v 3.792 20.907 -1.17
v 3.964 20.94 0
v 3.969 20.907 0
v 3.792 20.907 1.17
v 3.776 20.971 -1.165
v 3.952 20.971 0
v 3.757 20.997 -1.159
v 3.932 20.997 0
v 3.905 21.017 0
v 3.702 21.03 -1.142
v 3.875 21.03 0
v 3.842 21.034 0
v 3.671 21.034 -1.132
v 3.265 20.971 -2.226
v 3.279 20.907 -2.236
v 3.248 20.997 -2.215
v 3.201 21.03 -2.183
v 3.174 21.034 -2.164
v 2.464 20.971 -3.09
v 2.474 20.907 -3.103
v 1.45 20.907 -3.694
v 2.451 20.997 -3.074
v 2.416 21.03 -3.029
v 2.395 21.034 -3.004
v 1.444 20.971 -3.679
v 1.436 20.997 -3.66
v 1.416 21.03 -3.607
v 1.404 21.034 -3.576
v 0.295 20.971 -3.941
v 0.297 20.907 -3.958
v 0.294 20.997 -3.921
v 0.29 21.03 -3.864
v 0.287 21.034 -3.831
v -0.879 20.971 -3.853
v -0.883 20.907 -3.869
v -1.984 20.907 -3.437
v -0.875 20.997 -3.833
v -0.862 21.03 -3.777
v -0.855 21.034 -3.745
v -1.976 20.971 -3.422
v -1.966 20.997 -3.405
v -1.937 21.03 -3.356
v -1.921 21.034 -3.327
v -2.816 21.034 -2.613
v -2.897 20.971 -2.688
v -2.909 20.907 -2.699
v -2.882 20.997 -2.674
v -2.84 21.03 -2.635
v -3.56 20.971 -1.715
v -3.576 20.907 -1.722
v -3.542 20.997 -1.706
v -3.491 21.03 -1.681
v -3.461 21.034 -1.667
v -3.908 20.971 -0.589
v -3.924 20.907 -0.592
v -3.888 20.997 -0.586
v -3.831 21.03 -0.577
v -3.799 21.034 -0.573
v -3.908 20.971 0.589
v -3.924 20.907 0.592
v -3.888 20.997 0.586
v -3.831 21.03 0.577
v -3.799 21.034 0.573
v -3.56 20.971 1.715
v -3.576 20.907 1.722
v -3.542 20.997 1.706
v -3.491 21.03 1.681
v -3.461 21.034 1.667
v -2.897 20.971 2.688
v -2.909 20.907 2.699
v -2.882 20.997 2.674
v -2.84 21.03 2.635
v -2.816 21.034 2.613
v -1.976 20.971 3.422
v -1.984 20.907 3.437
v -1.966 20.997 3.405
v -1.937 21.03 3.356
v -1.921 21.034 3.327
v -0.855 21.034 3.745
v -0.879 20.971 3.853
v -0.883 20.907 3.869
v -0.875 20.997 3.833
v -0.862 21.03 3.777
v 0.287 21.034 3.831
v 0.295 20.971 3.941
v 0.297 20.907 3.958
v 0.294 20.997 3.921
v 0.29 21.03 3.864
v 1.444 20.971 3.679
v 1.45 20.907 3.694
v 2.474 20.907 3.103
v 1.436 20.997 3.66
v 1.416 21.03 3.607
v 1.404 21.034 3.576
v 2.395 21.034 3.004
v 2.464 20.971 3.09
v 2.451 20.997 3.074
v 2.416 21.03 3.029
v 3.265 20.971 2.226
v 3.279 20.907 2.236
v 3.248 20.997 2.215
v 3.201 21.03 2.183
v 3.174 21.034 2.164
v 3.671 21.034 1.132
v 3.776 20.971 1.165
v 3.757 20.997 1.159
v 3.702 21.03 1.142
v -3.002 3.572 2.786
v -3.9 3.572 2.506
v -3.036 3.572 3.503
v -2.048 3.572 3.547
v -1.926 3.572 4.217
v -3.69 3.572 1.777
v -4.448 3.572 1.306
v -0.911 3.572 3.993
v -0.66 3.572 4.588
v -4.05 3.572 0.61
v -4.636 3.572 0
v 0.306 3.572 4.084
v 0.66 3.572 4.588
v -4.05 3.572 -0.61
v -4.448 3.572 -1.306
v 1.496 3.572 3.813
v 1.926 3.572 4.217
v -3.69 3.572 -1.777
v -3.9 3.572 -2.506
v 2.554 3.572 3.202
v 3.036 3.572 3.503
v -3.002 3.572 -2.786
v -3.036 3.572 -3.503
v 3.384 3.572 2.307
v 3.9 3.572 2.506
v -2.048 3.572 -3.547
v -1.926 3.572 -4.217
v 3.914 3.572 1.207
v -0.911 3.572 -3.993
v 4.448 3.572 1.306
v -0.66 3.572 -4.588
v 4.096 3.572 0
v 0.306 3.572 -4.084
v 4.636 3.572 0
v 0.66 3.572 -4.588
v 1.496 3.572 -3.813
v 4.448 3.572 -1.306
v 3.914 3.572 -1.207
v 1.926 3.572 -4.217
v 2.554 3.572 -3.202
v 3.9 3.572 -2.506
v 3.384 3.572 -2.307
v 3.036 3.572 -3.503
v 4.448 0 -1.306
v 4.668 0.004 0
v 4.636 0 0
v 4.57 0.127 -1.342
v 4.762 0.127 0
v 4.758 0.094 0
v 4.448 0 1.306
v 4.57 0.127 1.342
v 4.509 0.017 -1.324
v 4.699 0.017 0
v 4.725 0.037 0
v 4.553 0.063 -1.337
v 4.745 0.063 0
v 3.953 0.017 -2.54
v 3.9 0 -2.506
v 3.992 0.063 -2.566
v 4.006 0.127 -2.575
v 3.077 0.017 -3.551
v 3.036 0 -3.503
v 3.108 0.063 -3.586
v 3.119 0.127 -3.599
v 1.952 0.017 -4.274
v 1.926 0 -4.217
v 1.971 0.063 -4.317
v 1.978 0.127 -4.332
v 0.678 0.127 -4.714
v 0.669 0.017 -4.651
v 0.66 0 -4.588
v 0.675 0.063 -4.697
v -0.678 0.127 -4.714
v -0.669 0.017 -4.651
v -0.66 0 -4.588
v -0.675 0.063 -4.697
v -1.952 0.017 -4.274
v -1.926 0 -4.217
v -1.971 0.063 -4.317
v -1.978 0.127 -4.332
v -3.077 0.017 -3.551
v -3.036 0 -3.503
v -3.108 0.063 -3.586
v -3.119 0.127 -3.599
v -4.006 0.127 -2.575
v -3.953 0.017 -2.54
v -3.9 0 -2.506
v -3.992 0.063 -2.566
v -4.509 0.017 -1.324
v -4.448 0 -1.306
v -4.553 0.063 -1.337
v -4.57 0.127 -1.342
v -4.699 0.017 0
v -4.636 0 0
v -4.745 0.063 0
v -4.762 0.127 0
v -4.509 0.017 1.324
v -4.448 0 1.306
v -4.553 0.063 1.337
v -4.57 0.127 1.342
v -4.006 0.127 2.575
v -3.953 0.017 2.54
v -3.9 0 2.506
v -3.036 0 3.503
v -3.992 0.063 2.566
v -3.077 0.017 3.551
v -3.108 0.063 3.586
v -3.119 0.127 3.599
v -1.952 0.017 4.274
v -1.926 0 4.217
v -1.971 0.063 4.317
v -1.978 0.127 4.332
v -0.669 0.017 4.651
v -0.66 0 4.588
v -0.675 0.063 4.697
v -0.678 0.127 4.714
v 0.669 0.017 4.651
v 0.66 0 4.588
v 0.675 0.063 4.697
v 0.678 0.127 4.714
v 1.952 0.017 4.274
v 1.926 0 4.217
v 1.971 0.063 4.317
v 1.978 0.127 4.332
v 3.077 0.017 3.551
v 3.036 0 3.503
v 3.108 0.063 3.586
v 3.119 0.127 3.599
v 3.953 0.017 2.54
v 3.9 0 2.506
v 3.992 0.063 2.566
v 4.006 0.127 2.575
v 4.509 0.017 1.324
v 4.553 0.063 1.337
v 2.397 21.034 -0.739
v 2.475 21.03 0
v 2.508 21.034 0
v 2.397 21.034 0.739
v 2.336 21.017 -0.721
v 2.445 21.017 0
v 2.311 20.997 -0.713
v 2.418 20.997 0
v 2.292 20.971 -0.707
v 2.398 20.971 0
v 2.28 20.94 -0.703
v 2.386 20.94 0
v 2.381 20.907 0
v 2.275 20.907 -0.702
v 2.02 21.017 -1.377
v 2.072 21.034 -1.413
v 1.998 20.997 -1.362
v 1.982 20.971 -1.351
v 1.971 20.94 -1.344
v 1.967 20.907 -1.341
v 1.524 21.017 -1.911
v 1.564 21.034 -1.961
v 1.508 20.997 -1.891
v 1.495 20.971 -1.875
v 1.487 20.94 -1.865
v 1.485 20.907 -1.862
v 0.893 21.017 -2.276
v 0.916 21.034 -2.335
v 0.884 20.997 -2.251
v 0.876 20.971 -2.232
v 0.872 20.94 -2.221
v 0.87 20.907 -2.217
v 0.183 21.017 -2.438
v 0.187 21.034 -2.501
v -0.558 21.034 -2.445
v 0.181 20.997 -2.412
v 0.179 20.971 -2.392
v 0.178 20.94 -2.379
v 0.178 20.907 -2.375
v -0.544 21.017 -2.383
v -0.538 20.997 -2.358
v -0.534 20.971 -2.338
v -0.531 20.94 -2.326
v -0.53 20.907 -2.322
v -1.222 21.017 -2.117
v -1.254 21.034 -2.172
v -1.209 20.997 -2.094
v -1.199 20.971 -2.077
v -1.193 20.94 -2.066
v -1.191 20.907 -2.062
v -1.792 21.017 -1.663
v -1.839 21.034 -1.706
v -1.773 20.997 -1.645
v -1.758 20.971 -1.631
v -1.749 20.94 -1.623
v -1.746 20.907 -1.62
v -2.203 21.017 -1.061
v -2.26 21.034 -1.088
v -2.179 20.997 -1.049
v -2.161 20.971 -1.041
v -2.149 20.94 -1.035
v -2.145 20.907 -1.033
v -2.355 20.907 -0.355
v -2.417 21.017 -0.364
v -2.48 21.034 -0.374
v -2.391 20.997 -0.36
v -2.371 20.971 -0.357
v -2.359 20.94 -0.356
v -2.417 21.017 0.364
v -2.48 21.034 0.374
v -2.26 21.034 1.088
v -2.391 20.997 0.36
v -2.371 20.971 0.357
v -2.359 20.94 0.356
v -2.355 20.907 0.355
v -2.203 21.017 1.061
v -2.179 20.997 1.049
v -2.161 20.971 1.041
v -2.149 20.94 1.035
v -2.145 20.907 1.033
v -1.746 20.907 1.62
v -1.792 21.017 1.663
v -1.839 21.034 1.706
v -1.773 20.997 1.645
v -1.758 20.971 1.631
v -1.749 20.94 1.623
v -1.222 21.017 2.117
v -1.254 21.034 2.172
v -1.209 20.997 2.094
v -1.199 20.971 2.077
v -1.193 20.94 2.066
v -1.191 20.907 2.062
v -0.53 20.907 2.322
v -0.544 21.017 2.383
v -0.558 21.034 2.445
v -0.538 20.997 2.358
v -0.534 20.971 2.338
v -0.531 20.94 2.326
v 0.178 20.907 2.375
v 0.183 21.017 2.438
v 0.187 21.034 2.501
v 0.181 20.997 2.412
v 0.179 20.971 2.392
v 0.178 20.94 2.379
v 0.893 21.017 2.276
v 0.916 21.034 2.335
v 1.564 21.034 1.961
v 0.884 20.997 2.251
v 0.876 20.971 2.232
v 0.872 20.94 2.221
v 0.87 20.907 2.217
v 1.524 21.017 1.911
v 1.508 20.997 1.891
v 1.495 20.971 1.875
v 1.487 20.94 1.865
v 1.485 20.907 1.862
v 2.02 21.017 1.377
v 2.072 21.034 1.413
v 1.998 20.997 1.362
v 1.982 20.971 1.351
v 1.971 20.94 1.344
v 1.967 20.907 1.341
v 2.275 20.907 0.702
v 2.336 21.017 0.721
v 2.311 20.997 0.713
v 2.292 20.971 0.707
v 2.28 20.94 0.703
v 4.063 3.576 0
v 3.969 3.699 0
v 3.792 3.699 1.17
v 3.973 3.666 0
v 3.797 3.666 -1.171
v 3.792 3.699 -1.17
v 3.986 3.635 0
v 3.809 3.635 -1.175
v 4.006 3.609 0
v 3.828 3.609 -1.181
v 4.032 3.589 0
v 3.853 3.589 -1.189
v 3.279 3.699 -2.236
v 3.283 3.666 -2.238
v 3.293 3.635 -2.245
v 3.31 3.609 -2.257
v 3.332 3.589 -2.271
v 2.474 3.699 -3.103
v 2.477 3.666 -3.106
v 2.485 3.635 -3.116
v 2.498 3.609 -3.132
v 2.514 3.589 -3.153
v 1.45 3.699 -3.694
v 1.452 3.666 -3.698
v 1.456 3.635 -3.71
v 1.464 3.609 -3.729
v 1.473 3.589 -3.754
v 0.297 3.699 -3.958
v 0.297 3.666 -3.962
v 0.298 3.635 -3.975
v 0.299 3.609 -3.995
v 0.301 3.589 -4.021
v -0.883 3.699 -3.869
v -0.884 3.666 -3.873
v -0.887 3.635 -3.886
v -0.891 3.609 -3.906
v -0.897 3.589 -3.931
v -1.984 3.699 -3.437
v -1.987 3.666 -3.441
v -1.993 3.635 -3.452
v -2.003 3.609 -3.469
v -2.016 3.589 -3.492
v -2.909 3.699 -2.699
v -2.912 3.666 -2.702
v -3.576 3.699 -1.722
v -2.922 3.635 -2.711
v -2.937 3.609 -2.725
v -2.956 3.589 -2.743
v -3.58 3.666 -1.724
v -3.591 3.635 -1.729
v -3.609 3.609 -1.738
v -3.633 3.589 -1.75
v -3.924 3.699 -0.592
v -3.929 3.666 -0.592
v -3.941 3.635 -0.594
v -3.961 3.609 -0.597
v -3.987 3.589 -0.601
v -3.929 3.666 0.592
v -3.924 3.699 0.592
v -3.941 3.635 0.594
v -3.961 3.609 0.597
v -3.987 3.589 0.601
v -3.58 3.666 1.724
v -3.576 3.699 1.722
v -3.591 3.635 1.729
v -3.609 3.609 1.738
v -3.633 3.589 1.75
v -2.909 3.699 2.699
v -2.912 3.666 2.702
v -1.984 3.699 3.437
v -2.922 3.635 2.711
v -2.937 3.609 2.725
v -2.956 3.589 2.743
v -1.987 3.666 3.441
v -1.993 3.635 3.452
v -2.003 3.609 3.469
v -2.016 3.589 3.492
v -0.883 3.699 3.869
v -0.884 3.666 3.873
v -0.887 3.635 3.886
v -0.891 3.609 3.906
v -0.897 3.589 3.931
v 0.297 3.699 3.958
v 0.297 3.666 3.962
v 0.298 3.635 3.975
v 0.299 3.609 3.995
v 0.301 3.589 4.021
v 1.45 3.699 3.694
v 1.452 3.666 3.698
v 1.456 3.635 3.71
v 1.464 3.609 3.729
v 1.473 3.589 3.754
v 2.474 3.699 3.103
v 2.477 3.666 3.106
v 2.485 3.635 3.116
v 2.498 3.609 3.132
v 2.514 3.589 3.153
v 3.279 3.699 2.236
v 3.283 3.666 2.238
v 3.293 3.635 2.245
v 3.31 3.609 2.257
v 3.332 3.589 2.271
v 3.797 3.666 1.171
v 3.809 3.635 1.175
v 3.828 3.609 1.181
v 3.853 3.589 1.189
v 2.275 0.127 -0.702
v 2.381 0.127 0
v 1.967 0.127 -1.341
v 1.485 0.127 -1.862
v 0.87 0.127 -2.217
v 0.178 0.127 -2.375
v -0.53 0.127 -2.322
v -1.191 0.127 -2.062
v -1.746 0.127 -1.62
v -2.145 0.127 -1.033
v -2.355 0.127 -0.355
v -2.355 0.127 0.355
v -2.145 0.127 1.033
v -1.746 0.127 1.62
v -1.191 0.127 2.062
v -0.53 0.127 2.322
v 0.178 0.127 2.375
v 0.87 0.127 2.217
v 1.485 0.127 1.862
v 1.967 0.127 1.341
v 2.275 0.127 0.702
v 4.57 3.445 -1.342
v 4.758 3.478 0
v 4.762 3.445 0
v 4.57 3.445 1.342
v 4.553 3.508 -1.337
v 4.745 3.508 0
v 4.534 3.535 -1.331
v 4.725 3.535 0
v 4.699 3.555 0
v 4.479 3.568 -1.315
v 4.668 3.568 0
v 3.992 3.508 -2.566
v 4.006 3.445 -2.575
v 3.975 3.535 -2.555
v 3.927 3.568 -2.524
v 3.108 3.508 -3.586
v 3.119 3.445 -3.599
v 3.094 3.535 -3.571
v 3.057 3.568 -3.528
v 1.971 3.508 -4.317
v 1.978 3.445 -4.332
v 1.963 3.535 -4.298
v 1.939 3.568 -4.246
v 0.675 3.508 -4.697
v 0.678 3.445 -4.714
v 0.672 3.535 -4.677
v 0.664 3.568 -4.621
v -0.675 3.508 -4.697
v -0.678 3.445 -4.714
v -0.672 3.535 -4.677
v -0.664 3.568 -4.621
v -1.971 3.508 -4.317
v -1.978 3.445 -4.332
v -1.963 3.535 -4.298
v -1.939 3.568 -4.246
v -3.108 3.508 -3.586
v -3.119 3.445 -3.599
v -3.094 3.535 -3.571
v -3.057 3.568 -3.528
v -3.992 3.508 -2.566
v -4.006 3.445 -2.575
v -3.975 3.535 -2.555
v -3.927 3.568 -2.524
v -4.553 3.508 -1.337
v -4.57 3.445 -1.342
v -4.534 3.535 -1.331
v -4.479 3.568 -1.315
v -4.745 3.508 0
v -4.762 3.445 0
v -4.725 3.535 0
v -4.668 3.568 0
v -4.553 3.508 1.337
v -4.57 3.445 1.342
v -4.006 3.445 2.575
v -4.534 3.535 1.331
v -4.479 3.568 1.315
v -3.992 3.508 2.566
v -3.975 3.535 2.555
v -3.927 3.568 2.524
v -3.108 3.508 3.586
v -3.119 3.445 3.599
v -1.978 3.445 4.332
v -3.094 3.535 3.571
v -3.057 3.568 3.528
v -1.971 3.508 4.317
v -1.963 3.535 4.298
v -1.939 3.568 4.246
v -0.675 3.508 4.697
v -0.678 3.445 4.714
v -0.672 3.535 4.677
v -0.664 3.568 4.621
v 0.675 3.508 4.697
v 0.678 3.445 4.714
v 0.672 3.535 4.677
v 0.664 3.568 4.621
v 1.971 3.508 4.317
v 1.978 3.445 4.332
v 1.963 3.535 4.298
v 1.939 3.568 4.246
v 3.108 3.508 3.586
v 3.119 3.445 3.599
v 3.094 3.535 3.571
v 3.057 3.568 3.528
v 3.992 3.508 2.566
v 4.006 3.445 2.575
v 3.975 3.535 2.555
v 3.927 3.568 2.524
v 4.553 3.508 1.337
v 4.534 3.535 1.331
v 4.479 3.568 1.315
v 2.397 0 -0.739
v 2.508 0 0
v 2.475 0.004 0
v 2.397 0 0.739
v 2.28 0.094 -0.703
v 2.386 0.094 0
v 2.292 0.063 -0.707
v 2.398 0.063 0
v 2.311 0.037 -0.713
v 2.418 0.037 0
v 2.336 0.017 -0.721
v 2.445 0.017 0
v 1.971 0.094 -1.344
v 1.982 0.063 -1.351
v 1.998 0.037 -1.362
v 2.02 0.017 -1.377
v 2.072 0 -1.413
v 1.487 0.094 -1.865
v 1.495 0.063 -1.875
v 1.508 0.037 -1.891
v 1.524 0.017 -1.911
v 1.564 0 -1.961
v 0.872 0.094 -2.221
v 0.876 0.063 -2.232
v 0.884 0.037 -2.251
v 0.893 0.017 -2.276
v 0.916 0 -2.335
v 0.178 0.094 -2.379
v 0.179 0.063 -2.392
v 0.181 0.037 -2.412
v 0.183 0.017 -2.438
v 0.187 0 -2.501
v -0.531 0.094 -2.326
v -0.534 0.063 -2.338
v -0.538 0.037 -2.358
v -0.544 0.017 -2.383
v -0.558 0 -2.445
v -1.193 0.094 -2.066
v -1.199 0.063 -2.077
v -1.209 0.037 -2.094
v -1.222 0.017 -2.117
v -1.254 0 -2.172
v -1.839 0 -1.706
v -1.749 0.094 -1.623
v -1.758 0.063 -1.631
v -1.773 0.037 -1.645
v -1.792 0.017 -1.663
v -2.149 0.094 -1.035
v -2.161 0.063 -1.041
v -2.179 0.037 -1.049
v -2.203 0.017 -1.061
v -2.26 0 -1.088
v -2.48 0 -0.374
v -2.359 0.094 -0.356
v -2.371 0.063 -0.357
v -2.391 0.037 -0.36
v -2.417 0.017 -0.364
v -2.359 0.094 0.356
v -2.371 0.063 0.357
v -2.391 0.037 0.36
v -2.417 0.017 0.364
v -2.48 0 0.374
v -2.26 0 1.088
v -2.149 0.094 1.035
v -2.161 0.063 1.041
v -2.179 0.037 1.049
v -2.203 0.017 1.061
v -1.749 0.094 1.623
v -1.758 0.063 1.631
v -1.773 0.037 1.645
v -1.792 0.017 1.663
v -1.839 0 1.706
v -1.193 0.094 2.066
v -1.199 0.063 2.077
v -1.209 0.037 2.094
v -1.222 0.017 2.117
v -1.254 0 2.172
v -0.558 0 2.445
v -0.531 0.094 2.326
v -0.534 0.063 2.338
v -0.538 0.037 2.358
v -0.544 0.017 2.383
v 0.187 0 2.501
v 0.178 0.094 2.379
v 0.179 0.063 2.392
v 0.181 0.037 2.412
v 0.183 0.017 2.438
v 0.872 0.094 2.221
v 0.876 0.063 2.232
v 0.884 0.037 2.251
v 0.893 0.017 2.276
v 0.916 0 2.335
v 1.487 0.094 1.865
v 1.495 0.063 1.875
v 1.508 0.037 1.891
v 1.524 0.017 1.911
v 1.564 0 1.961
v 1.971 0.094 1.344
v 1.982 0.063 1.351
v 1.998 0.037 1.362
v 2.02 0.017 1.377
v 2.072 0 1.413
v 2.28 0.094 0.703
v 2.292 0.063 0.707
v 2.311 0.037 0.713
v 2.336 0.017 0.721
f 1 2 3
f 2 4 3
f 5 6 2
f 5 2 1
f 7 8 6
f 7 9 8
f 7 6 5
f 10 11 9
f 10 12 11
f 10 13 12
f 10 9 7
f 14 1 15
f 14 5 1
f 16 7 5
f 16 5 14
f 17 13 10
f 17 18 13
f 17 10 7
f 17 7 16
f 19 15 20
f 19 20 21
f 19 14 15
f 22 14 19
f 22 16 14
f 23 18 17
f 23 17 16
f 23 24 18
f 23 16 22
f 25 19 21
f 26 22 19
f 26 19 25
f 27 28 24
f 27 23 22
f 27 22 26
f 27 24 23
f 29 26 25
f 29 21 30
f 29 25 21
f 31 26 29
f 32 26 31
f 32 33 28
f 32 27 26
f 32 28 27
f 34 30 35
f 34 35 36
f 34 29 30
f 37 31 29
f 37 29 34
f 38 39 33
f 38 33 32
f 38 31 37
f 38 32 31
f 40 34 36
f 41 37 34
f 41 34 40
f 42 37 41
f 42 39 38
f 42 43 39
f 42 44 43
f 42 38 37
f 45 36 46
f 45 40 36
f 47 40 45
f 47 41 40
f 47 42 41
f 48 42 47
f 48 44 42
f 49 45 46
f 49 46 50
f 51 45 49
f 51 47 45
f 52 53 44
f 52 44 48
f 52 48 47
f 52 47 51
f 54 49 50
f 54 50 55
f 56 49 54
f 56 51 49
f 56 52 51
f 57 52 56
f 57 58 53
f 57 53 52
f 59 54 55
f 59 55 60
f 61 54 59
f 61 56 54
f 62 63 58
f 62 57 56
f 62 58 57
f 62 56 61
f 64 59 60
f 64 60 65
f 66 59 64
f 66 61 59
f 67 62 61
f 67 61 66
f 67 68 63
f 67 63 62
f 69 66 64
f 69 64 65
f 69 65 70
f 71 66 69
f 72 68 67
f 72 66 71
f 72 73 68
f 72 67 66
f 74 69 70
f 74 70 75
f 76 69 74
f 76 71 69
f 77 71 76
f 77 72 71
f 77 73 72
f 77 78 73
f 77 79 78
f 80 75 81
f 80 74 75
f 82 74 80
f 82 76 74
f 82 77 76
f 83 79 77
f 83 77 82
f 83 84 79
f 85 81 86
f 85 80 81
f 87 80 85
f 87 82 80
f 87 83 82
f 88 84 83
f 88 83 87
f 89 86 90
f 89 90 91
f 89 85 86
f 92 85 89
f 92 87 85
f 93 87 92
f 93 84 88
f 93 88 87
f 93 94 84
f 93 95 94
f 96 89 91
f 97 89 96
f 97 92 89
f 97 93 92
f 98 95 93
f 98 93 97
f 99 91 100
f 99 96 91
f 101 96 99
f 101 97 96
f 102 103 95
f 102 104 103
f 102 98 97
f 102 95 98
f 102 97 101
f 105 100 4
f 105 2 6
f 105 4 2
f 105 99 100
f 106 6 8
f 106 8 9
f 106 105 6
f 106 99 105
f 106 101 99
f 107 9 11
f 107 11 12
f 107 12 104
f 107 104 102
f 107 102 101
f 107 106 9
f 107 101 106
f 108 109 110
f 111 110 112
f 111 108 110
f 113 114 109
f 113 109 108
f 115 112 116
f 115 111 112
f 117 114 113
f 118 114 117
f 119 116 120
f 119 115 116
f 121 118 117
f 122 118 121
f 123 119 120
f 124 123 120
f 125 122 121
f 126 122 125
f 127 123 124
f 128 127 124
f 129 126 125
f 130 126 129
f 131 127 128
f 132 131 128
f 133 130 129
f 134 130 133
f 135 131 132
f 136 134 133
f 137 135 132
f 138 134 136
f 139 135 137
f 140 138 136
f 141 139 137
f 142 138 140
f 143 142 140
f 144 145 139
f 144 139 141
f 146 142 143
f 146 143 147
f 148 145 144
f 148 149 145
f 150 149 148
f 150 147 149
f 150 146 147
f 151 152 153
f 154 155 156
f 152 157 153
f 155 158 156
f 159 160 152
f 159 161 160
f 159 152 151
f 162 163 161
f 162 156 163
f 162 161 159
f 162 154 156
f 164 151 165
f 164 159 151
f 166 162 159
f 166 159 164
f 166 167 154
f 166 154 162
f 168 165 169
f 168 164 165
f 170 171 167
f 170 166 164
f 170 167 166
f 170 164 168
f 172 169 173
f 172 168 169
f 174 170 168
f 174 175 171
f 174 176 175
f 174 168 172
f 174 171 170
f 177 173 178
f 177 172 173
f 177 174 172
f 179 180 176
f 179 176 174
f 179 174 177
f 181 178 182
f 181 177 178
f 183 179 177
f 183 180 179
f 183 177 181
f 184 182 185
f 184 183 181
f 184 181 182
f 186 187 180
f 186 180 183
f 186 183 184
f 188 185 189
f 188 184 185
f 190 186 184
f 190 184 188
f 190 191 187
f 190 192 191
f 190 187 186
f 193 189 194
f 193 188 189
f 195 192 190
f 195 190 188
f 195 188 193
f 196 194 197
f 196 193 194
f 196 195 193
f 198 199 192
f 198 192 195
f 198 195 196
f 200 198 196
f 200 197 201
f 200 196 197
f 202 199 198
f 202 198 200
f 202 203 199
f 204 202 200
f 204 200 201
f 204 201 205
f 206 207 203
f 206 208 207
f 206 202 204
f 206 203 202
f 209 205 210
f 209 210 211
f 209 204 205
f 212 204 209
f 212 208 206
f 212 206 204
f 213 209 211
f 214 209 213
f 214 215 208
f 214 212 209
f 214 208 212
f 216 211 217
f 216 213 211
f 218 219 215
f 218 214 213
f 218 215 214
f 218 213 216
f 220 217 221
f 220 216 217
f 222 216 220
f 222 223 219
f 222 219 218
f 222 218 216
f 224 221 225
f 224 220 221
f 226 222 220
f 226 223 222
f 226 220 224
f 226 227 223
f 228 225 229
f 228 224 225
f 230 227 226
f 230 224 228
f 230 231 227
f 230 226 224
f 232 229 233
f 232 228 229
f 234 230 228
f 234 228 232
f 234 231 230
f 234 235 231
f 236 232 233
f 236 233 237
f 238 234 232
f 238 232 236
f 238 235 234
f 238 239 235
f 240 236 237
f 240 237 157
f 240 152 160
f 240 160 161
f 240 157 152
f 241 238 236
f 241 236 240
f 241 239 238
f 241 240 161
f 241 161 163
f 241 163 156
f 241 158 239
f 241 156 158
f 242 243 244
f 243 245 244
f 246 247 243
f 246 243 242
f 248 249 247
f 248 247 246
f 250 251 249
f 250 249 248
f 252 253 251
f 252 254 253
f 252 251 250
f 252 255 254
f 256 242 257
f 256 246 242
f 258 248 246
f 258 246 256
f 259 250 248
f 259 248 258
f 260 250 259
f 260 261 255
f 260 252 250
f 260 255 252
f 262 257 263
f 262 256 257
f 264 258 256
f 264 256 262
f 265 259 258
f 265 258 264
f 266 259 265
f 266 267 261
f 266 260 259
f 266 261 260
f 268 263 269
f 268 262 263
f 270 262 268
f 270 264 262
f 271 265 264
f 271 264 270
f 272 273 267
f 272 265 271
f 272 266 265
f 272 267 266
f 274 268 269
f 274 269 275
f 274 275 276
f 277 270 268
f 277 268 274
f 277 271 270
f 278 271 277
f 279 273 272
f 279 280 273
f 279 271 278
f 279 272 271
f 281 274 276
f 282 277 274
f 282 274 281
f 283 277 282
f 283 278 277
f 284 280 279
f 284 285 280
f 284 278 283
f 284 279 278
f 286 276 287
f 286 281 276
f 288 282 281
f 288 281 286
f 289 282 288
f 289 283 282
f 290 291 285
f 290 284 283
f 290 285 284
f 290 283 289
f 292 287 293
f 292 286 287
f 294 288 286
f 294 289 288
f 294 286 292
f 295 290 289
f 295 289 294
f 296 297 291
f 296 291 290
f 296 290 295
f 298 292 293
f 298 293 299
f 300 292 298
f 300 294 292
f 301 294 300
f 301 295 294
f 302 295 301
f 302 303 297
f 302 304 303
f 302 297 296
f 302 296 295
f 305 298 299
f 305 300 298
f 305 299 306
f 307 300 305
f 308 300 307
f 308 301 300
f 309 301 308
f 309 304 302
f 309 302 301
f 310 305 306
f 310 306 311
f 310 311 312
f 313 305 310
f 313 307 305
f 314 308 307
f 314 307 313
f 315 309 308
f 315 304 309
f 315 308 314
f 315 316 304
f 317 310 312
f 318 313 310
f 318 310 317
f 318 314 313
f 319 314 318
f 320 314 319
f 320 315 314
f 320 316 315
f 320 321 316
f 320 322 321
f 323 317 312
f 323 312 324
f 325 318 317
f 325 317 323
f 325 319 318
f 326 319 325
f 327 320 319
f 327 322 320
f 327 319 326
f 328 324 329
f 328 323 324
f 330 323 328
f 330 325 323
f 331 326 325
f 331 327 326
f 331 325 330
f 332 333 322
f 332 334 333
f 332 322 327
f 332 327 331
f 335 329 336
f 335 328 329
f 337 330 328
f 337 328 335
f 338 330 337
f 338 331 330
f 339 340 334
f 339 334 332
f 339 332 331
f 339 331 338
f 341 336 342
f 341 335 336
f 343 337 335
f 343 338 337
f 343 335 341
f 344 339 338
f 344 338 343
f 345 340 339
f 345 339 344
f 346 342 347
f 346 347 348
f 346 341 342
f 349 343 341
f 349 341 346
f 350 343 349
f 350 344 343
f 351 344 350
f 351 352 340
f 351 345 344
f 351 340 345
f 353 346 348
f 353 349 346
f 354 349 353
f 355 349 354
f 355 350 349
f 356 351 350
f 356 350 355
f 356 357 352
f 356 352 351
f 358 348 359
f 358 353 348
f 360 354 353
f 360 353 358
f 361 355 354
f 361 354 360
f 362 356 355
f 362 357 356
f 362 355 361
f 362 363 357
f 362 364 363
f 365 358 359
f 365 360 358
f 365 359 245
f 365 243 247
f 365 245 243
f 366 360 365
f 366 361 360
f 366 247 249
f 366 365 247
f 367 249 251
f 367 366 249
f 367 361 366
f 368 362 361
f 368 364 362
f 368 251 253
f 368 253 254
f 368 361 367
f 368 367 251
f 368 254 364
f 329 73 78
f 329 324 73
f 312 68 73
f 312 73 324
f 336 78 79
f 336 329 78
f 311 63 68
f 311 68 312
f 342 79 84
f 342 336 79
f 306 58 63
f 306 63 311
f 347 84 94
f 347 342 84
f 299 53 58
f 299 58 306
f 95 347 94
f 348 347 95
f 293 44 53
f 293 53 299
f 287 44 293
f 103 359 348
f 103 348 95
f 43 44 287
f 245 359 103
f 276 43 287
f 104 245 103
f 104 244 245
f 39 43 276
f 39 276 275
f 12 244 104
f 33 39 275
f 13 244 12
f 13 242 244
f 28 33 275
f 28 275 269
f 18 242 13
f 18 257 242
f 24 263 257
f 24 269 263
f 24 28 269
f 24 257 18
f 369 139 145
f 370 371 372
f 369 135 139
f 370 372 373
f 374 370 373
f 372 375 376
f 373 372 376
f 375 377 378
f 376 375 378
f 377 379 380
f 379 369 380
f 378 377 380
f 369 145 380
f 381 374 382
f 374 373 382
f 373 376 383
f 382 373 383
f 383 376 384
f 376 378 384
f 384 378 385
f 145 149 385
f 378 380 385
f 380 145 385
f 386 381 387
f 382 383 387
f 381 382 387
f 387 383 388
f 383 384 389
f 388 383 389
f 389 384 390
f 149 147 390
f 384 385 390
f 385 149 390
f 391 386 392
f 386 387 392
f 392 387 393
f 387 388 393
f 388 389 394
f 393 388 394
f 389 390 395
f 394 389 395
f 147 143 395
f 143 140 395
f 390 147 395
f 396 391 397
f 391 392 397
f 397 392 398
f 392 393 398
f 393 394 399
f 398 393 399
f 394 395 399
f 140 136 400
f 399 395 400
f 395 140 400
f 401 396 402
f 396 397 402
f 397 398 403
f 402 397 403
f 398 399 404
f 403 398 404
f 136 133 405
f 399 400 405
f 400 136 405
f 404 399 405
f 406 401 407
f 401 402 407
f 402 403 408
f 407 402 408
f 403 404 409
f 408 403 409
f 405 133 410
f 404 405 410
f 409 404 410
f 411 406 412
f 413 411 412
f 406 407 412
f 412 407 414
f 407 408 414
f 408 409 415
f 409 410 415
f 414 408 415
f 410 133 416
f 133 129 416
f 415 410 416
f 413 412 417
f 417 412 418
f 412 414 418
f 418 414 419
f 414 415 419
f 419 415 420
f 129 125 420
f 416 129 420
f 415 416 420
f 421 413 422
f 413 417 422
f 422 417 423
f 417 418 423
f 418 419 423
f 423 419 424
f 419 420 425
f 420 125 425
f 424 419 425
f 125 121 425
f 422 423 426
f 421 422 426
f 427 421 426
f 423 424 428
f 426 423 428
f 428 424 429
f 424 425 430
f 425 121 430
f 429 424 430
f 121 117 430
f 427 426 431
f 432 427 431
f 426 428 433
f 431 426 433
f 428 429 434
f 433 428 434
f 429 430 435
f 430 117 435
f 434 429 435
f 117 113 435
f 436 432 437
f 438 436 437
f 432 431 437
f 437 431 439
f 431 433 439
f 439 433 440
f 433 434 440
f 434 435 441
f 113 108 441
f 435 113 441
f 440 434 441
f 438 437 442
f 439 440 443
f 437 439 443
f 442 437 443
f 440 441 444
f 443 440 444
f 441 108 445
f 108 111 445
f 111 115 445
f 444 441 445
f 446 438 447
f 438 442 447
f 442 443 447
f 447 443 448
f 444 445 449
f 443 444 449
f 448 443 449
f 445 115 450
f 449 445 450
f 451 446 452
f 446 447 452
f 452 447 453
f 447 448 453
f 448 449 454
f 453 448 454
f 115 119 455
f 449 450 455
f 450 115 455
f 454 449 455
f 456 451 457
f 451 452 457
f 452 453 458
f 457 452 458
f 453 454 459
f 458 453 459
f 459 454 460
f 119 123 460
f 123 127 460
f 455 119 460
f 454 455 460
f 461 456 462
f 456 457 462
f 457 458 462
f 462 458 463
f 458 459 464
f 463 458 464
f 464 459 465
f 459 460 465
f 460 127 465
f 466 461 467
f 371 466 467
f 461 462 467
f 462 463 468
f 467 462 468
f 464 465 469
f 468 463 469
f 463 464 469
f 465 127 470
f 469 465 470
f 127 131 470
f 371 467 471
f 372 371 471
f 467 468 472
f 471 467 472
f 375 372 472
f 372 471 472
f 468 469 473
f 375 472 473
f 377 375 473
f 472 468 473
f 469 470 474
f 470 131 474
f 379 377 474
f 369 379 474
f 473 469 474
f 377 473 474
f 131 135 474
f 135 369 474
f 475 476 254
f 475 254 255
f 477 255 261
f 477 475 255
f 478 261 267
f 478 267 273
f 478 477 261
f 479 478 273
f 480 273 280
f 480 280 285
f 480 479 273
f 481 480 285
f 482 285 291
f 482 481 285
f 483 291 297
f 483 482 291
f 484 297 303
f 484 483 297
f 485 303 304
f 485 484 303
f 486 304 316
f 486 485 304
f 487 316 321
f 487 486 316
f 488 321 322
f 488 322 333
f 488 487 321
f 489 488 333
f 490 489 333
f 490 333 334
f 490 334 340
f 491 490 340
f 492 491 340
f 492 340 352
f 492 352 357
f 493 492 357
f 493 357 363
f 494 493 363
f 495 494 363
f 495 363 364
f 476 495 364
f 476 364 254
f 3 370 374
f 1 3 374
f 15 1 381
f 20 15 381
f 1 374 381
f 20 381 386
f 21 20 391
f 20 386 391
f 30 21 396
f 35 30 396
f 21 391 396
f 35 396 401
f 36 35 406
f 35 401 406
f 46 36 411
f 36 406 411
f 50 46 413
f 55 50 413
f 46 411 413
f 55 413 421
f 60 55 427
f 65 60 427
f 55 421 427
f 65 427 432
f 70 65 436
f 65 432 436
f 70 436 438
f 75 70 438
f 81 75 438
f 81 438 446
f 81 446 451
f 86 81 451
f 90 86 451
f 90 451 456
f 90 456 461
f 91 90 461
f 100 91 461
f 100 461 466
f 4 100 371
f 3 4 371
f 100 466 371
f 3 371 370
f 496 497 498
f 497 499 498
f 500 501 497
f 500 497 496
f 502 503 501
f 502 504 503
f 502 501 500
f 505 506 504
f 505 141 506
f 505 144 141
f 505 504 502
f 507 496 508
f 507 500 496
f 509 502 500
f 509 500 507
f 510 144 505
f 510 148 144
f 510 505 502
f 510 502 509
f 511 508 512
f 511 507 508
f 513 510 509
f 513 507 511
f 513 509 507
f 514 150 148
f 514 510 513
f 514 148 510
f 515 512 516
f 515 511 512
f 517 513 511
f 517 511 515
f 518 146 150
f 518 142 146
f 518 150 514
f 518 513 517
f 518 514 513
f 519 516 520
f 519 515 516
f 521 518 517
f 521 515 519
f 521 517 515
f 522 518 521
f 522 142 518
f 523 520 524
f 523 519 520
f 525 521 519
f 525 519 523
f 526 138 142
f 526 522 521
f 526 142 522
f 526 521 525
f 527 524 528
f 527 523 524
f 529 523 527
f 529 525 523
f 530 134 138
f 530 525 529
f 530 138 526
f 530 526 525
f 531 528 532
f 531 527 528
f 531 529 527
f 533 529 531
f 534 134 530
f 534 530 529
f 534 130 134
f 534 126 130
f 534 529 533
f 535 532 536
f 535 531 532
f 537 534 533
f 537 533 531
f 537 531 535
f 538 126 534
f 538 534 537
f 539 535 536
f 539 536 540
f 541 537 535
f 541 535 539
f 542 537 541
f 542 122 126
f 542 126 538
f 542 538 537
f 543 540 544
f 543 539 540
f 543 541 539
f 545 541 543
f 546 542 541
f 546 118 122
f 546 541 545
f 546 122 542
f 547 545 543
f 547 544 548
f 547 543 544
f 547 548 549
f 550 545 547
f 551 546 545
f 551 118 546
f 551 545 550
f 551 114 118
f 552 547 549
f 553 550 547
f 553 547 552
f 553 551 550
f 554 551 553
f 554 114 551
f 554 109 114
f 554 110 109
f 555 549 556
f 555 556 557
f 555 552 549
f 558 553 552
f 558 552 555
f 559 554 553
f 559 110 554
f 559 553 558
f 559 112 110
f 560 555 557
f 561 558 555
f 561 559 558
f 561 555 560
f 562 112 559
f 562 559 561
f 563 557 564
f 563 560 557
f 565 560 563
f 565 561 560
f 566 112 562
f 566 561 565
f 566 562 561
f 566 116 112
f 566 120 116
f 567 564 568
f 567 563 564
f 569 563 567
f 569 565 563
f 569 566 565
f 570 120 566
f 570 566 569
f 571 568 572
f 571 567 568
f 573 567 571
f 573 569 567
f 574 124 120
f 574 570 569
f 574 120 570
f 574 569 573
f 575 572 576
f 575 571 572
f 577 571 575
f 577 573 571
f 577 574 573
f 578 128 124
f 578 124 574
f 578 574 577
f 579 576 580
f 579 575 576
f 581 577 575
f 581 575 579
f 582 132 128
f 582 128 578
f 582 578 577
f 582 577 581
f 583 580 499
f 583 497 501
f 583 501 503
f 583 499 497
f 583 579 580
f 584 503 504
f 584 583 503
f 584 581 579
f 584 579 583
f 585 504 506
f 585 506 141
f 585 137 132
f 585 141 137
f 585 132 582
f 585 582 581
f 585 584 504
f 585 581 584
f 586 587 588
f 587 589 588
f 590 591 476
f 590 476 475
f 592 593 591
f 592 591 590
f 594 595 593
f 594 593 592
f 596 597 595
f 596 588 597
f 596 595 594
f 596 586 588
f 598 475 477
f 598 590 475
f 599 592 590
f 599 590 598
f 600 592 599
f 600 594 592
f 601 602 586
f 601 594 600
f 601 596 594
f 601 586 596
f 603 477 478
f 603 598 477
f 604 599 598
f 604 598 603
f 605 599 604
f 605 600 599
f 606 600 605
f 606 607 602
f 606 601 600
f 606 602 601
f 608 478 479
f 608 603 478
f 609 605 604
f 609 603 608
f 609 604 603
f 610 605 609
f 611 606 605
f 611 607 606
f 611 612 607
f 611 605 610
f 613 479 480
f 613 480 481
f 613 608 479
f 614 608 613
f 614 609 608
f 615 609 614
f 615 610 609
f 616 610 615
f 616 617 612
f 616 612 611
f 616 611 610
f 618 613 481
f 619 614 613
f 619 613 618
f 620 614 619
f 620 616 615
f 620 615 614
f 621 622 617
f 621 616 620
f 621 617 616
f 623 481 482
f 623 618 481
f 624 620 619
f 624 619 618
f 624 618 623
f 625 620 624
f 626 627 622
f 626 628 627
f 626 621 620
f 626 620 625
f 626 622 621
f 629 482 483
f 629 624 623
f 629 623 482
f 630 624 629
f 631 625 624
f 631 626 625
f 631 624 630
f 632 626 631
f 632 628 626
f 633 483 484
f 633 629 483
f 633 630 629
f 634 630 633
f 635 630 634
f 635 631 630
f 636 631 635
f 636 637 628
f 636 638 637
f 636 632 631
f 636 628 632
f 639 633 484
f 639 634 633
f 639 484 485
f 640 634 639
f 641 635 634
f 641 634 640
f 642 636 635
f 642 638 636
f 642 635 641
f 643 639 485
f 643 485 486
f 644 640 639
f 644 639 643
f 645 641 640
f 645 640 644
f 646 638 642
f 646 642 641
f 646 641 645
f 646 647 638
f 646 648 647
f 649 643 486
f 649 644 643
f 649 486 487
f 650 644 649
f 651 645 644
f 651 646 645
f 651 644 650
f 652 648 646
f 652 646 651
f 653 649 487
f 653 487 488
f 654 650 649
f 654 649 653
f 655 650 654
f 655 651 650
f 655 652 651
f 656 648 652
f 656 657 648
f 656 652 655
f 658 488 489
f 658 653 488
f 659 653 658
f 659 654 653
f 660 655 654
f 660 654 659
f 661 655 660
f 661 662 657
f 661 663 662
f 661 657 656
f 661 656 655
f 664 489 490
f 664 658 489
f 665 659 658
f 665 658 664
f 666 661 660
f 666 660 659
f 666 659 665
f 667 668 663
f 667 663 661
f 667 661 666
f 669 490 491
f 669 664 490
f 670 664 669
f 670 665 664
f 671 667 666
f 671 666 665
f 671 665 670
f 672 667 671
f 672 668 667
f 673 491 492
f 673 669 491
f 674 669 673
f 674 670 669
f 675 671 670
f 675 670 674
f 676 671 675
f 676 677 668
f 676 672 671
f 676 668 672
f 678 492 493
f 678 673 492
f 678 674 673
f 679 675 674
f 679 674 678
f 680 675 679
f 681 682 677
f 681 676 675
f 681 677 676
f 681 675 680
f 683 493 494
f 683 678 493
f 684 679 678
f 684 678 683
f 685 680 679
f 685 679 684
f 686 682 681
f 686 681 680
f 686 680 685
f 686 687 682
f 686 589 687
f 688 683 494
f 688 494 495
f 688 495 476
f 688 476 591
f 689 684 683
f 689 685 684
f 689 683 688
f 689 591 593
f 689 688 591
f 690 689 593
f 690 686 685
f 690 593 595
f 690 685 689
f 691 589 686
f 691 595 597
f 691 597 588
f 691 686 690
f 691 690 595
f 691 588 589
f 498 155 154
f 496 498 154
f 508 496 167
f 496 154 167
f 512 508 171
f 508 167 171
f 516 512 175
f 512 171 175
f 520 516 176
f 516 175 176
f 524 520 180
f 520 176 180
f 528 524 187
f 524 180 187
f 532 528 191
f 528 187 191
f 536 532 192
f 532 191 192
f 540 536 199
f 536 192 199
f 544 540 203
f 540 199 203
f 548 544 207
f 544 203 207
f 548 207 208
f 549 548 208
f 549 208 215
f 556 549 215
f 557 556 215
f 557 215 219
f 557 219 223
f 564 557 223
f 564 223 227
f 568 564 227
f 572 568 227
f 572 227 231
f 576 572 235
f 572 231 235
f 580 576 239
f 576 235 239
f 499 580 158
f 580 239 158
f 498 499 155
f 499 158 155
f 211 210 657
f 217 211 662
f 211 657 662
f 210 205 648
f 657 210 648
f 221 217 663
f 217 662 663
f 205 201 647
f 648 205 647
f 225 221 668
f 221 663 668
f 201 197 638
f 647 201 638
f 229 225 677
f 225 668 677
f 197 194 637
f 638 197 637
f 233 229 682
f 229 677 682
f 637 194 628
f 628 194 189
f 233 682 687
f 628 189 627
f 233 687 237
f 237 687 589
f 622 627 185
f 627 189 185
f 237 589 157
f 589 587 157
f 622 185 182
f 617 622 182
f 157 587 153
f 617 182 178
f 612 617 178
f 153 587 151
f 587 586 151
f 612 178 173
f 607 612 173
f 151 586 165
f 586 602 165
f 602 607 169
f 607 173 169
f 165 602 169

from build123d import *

# Parameters (mm, degrees)
SKETCH1_R           = 4.7625
SKETCH1_R_2         = 2.38125
BOSS_EXTRUDE1_DEPTH = 3.571875
SKETCH2_R           = 3.96875
SKETCH2_R_2         = 2.38125
BOSS_EXTRUDE2_DEPTH = 17.4625
FILLET1_R           = 0.127


with BuildPart() as part:
    # Sketch1 → Boss-Extrude1 (new body)
    with BuildSketch(Plane(origin=(0, 0, 0), x_dir=(1, 0, 0), z_dir=(0, 1, 0))):
        Circle(SKETCH1_R)
        Circle(SKETCH1_R_2, mode=Mode.SUBTRACT)
    extrude(amount=BOSS_EXTRUDE1_DEPTH)

    # Sketch2 → Boss-Extrude2 (add)
    with BuildSketch(Plane(origin=(0, 3.571875, 0), x_dir=(1, 0, 0), z_dir=(0, 1, 0))):
        Circle(SKETCH2_R)
        Circle(SKETCH2_R_2, mode=Mode.SUBTRACT)
    extrude(amount=BOSS_EXTRUDE2_DEPTH)

    # Fillet1
    fillet1_edges = [part.edges().sort_by_distance(p)[0] for p in [
        (-3.96875, 3.571875, 0),
        (-3.96875, 21.034375, 0),
        (-2.38125, 21.034375, 0),
        (-4.7625, 0, 0),
        (-4.7625, 3.571875, 0),
        (-2.38125, 0, 0),
    ]]
    fillet(fillet1_edges, radius=FILLET1_R)


solid = part.part
